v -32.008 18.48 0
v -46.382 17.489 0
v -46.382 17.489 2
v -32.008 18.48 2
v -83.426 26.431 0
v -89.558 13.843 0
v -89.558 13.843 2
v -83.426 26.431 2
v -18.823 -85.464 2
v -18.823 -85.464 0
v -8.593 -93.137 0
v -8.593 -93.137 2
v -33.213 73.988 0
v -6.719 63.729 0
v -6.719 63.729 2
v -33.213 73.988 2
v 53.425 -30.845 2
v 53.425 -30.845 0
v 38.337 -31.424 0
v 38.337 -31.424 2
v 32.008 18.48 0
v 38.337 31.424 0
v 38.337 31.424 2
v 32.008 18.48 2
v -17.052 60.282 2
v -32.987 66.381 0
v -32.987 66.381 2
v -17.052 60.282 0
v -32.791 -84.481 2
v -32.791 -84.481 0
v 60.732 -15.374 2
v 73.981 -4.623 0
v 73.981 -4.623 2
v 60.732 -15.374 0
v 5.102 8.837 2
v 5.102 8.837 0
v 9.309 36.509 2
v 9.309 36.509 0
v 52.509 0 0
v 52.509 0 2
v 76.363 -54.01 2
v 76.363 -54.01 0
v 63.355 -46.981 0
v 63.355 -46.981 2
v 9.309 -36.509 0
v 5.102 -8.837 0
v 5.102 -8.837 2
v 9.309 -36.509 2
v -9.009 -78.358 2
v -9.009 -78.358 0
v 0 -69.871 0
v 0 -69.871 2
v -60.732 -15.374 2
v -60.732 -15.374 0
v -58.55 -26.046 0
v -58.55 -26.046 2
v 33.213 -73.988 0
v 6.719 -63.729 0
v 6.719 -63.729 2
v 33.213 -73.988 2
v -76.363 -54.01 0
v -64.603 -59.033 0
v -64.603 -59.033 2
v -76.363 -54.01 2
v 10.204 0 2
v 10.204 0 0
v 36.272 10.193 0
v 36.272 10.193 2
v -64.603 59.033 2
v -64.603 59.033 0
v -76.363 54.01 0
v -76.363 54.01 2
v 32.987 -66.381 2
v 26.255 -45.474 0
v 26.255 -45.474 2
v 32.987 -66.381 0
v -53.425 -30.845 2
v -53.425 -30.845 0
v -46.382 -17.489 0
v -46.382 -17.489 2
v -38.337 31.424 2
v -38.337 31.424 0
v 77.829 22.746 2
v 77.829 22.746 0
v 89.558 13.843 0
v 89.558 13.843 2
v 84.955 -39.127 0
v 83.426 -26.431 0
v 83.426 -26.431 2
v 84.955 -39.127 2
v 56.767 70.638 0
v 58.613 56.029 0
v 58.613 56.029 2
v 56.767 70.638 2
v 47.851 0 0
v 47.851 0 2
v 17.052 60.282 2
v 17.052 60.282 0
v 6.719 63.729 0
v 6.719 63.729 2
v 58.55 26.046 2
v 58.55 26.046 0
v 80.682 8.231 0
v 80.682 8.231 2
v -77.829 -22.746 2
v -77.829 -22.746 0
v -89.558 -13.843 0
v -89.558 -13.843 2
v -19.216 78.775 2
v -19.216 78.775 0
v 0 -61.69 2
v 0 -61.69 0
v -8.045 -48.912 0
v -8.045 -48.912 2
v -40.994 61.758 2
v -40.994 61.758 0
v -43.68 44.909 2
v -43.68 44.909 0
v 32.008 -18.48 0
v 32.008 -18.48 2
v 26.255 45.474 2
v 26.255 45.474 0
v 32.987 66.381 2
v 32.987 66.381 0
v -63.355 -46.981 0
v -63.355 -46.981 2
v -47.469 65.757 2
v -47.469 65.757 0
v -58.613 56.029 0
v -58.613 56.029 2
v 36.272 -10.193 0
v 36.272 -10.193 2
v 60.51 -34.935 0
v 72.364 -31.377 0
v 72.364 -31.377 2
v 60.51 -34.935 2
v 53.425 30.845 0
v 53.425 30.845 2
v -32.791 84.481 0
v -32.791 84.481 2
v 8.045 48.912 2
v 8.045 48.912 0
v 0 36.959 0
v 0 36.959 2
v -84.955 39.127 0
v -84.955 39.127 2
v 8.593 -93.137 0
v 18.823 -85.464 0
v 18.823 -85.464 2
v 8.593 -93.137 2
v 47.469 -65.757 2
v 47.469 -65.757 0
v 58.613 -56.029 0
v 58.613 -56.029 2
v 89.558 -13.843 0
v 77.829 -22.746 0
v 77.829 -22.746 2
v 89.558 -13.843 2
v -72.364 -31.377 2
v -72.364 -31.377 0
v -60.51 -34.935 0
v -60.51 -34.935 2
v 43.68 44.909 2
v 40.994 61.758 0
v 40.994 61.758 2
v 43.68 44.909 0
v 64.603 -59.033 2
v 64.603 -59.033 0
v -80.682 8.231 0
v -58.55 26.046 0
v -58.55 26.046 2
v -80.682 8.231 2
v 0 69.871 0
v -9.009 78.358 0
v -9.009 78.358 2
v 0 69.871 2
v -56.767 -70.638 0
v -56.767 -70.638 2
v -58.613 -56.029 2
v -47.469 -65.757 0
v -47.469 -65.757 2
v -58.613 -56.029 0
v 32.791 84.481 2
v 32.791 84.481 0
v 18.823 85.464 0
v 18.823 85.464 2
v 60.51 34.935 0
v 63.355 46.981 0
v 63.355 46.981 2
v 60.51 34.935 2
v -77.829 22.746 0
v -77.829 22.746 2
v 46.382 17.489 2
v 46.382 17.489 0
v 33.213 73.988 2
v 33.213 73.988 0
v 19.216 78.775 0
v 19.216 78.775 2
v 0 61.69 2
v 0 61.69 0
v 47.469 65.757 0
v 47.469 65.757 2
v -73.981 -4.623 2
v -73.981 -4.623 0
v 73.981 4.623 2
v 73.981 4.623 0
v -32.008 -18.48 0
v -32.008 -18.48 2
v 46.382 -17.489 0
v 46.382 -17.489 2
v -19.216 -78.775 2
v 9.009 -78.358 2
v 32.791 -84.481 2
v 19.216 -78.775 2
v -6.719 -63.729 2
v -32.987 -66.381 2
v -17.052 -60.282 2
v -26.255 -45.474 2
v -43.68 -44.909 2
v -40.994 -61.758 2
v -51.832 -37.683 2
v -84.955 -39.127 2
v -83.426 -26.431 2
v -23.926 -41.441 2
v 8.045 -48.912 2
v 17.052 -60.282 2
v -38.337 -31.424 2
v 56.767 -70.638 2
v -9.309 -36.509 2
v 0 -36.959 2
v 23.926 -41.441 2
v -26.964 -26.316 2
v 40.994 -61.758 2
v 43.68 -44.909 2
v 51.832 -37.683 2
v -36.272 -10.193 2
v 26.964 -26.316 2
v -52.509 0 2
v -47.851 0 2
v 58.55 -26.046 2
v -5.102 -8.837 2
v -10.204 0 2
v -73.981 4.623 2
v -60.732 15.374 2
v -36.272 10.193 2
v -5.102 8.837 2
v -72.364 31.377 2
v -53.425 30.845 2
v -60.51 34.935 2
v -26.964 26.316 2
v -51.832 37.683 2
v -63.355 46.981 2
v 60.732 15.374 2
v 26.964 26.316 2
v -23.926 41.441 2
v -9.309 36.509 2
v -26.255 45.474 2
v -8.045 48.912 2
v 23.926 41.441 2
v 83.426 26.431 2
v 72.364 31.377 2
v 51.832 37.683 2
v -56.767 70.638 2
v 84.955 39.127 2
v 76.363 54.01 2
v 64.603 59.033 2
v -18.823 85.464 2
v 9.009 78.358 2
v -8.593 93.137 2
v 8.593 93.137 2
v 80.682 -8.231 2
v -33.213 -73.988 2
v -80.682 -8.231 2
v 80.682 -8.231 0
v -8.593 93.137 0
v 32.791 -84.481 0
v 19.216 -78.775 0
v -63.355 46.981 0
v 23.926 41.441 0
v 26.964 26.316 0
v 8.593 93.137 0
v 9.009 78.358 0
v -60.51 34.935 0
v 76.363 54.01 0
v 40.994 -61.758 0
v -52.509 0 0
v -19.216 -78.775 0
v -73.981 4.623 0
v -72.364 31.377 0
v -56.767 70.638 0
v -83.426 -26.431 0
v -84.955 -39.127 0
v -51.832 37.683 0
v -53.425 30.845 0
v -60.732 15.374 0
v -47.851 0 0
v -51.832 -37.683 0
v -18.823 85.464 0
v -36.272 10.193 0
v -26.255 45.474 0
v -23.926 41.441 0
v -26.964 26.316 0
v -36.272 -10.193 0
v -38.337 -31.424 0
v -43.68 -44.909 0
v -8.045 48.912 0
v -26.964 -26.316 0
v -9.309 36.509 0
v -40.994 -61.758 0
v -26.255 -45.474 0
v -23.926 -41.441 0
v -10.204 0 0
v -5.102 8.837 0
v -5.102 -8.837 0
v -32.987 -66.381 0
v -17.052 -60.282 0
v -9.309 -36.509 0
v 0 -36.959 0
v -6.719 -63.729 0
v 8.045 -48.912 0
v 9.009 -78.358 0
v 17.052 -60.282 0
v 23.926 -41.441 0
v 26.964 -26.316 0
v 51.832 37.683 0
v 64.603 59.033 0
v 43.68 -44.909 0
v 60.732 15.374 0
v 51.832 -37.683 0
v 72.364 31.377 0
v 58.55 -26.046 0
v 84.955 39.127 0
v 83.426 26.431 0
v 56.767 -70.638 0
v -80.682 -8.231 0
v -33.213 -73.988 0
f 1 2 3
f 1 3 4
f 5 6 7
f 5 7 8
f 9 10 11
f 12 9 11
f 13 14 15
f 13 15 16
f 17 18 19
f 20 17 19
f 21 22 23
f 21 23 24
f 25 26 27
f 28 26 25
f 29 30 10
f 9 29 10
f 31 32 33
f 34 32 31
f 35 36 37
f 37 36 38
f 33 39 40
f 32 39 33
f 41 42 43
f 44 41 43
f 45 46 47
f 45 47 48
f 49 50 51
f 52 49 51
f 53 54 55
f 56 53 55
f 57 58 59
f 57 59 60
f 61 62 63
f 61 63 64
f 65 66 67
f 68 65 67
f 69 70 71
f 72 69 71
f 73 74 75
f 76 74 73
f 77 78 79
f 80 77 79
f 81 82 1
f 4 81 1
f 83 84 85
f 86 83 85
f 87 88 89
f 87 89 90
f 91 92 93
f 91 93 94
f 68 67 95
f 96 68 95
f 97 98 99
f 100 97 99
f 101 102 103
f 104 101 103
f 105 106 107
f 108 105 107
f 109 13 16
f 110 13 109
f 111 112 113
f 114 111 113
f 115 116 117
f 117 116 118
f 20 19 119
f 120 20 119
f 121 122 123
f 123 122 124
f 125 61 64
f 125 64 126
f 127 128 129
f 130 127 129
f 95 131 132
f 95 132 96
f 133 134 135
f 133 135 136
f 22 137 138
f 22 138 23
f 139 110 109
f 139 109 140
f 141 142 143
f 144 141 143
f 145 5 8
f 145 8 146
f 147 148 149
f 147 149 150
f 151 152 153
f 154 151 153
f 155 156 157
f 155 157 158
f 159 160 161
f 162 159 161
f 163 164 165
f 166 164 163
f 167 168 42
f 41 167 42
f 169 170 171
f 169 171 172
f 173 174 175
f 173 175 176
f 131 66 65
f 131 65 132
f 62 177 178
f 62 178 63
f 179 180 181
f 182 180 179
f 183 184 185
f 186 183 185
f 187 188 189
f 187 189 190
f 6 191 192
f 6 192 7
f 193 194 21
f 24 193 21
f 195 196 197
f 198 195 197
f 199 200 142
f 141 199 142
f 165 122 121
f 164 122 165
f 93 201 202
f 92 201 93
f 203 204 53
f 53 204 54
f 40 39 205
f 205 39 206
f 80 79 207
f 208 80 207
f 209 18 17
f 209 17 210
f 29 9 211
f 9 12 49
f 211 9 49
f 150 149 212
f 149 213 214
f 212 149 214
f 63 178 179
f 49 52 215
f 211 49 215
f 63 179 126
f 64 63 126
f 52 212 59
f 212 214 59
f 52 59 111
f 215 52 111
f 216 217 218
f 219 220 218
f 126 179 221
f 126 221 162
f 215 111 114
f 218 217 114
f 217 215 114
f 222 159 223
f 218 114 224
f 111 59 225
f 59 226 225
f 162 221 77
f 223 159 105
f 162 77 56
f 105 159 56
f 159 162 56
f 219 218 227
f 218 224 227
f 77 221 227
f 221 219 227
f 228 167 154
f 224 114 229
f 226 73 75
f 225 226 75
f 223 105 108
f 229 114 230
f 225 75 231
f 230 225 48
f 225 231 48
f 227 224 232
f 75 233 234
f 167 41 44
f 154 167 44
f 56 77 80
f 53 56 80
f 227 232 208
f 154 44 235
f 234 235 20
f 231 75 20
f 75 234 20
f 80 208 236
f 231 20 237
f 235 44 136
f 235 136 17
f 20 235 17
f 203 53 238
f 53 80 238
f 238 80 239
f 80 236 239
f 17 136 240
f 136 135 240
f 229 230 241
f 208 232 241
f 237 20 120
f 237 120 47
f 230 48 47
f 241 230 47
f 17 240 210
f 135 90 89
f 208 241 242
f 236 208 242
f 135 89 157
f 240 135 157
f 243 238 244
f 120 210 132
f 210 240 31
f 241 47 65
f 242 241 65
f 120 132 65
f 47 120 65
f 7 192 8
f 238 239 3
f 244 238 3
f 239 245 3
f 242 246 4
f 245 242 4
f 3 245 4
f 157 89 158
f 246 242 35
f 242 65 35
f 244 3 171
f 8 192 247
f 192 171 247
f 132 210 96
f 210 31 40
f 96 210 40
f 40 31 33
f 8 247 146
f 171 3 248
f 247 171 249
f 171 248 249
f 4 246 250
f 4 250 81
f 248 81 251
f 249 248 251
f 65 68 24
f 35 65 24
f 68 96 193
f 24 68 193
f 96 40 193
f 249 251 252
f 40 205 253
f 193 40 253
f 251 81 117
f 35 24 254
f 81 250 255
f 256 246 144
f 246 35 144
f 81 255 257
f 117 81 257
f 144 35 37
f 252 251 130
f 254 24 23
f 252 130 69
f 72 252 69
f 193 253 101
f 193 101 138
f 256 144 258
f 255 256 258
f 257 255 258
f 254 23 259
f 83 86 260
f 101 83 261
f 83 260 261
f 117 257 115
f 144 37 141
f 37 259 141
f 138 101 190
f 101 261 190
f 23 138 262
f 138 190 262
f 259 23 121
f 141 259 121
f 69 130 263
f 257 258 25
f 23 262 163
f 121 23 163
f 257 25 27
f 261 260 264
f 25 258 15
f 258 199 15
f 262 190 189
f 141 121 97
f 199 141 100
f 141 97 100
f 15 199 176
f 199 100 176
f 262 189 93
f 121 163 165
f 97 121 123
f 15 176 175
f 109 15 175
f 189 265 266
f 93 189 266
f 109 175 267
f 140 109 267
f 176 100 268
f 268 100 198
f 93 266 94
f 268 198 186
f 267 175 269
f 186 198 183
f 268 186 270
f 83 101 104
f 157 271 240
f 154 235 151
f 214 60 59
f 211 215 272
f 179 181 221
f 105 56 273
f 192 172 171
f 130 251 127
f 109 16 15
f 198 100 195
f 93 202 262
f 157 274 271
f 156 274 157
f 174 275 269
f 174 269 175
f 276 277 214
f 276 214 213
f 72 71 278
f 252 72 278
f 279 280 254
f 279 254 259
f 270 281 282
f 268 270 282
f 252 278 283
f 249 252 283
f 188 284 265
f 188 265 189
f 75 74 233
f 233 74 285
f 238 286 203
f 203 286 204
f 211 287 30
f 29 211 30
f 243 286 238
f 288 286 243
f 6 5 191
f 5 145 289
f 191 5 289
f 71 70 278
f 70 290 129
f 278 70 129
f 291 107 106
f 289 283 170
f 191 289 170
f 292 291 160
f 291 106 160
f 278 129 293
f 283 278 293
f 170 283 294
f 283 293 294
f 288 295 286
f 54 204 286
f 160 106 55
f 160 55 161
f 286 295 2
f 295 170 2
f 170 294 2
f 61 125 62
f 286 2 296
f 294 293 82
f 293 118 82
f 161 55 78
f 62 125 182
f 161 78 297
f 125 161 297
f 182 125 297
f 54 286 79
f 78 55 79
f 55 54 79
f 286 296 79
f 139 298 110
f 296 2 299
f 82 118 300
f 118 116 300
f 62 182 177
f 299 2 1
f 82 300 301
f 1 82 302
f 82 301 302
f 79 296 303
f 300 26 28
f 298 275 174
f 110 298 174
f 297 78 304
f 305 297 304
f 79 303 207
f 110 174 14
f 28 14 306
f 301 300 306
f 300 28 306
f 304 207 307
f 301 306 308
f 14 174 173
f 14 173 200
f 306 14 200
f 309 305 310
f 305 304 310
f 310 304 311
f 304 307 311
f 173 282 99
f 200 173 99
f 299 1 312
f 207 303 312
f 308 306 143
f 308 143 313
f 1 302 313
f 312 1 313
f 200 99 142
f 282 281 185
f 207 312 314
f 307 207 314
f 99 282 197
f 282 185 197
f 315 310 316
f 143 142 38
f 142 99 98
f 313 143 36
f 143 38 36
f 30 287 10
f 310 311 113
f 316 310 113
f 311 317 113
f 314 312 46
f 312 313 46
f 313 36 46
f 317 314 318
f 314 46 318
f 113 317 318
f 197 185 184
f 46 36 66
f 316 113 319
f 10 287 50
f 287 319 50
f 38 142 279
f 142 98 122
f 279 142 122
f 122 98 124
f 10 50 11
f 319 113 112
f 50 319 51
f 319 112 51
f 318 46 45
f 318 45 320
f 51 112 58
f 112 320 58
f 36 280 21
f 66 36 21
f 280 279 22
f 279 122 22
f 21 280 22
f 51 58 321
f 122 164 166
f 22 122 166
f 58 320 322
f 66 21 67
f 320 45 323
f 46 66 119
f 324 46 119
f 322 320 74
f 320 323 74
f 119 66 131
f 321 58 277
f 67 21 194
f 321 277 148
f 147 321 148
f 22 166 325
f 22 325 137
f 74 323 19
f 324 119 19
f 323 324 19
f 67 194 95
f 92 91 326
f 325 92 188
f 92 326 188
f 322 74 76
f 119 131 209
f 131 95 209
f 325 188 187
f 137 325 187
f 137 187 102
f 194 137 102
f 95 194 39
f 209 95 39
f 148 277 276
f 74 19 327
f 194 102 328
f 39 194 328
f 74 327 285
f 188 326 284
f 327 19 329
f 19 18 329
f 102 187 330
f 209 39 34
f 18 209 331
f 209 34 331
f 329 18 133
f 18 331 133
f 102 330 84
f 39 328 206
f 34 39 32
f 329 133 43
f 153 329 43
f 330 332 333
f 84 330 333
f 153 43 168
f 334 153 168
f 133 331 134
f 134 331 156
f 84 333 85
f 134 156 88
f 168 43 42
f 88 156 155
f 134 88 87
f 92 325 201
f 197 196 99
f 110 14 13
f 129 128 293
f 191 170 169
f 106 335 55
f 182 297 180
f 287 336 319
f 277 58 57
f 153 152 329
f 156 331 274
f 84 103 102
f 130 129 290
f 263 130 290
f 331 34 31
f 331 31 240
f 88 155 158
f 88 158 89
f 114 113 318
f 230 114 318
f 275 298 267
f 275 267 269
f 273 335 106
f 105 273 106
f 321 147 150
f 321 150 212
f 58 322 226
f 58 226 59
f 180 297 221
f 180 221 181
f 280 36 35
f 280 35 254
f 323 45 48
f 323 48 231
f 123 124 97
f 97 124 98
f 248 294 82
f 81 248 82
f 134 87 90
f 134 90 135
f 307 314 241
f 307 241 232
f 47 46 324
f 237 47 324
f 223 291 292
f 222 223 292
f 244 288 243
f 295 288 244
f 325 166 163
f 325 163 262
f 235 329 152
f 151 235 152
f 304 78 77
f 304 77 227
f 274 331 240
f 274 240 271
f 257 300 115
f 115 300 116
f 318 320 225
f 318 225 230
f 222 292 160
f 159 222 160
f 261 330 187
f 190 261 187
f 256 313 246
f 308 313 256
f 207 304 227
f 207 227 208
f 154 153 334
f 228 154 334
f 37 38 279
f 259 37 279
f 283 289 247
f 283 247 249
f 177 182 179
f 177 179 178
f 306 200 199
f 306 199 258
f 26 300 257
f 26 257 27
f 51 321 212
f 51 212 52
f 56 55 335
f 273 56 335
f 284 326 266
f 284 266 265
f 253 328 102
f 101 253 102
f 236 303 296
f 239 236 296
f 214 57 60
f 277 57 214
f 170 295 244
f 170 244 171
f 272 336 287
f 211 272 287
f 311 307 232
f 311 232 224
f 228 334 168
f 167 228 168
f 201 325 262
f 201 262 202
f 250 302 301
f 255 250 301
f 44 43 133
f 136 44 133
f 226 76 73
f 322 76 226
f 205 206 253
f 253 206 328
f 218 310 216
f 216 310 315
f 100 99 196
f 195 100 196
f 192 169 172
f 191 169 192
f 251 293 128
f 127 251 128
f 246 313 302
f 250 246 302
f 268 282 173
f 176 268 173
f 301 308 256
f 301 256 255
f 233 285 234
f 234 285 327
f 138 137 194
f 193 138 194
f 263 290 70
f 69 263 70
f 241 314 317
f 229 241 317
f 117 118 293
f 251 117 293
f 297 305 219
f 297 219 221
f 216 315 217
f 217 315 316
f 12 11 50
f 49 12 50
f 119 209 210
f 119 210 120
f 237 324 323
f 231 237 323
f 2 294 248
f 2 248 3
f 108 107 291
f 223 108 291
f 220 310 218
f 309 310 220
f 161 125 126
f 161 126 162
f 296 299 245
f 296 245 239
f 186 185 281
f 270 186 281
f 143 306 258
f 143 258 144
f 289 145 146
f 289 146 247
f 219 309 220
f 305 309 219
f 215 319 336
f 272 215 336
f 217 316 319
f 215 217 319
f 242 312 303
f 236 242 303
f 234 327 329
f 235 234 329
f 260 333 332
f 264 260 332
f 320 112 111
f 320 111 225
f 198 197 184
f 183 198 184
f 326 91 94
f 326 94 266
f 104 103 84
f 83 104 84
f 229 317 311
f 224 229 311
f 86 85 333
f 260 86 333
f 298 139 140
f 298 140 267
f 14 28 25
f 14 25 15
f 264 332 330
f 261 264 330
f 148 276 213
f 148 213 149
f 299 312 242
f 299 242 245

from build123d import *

# Parameters (mm, degrees)
F1_DEPTH = 2
F4_COUNT = 6
F4_ANGLE = 300


with BuildPart() as f1:
    # F0 (on Top) → F1 (new body)
    with BuildSketch(Plane.XY):
        Polygon((-3.2329817768, 66.8248683214), (8.0453734845, 48.9121899009), (-2.093318617, 33.8490381837), (0, 13.6142224073), (0, 0), (3.7587733038, 0), (9.3085616827, 36.5094803274), (25.0811669976, 41.8303571641), (32.9873822629, 66.3811415434), (17.0520264655, 60.2824240923), (6.7185084336, 63.7288540602), (33.2126766443, 73.987826705), (19.2160885781, 78.7753090262), (32.7906534076, 84.480561316), (18.8226215541, 85.4642242193), (8.5925143212, 93.1368023157), (9.0090529993, 78.3579275012), align=None)
    extrude(amount=F1_DEPTH)

    # F2: F1 across plane


with BuildPart() as f1_1:
    add(f1.part)
    add(f1.part.mirror(Plane.YZ))

    # F4: F1 ×6 about axis
    f4_axis = Axis((0, 0, 4.1130185127), (0, 0, 1))


with BuildPart() as f1_2:
    add(f1_1.part)
    for i in range(1, F4_COUNT):
        add(f1_1.part.rotate(f4_axis, i * F4_ANGLE / (F4_COUNT - 1)))


solid = f1_2.part
